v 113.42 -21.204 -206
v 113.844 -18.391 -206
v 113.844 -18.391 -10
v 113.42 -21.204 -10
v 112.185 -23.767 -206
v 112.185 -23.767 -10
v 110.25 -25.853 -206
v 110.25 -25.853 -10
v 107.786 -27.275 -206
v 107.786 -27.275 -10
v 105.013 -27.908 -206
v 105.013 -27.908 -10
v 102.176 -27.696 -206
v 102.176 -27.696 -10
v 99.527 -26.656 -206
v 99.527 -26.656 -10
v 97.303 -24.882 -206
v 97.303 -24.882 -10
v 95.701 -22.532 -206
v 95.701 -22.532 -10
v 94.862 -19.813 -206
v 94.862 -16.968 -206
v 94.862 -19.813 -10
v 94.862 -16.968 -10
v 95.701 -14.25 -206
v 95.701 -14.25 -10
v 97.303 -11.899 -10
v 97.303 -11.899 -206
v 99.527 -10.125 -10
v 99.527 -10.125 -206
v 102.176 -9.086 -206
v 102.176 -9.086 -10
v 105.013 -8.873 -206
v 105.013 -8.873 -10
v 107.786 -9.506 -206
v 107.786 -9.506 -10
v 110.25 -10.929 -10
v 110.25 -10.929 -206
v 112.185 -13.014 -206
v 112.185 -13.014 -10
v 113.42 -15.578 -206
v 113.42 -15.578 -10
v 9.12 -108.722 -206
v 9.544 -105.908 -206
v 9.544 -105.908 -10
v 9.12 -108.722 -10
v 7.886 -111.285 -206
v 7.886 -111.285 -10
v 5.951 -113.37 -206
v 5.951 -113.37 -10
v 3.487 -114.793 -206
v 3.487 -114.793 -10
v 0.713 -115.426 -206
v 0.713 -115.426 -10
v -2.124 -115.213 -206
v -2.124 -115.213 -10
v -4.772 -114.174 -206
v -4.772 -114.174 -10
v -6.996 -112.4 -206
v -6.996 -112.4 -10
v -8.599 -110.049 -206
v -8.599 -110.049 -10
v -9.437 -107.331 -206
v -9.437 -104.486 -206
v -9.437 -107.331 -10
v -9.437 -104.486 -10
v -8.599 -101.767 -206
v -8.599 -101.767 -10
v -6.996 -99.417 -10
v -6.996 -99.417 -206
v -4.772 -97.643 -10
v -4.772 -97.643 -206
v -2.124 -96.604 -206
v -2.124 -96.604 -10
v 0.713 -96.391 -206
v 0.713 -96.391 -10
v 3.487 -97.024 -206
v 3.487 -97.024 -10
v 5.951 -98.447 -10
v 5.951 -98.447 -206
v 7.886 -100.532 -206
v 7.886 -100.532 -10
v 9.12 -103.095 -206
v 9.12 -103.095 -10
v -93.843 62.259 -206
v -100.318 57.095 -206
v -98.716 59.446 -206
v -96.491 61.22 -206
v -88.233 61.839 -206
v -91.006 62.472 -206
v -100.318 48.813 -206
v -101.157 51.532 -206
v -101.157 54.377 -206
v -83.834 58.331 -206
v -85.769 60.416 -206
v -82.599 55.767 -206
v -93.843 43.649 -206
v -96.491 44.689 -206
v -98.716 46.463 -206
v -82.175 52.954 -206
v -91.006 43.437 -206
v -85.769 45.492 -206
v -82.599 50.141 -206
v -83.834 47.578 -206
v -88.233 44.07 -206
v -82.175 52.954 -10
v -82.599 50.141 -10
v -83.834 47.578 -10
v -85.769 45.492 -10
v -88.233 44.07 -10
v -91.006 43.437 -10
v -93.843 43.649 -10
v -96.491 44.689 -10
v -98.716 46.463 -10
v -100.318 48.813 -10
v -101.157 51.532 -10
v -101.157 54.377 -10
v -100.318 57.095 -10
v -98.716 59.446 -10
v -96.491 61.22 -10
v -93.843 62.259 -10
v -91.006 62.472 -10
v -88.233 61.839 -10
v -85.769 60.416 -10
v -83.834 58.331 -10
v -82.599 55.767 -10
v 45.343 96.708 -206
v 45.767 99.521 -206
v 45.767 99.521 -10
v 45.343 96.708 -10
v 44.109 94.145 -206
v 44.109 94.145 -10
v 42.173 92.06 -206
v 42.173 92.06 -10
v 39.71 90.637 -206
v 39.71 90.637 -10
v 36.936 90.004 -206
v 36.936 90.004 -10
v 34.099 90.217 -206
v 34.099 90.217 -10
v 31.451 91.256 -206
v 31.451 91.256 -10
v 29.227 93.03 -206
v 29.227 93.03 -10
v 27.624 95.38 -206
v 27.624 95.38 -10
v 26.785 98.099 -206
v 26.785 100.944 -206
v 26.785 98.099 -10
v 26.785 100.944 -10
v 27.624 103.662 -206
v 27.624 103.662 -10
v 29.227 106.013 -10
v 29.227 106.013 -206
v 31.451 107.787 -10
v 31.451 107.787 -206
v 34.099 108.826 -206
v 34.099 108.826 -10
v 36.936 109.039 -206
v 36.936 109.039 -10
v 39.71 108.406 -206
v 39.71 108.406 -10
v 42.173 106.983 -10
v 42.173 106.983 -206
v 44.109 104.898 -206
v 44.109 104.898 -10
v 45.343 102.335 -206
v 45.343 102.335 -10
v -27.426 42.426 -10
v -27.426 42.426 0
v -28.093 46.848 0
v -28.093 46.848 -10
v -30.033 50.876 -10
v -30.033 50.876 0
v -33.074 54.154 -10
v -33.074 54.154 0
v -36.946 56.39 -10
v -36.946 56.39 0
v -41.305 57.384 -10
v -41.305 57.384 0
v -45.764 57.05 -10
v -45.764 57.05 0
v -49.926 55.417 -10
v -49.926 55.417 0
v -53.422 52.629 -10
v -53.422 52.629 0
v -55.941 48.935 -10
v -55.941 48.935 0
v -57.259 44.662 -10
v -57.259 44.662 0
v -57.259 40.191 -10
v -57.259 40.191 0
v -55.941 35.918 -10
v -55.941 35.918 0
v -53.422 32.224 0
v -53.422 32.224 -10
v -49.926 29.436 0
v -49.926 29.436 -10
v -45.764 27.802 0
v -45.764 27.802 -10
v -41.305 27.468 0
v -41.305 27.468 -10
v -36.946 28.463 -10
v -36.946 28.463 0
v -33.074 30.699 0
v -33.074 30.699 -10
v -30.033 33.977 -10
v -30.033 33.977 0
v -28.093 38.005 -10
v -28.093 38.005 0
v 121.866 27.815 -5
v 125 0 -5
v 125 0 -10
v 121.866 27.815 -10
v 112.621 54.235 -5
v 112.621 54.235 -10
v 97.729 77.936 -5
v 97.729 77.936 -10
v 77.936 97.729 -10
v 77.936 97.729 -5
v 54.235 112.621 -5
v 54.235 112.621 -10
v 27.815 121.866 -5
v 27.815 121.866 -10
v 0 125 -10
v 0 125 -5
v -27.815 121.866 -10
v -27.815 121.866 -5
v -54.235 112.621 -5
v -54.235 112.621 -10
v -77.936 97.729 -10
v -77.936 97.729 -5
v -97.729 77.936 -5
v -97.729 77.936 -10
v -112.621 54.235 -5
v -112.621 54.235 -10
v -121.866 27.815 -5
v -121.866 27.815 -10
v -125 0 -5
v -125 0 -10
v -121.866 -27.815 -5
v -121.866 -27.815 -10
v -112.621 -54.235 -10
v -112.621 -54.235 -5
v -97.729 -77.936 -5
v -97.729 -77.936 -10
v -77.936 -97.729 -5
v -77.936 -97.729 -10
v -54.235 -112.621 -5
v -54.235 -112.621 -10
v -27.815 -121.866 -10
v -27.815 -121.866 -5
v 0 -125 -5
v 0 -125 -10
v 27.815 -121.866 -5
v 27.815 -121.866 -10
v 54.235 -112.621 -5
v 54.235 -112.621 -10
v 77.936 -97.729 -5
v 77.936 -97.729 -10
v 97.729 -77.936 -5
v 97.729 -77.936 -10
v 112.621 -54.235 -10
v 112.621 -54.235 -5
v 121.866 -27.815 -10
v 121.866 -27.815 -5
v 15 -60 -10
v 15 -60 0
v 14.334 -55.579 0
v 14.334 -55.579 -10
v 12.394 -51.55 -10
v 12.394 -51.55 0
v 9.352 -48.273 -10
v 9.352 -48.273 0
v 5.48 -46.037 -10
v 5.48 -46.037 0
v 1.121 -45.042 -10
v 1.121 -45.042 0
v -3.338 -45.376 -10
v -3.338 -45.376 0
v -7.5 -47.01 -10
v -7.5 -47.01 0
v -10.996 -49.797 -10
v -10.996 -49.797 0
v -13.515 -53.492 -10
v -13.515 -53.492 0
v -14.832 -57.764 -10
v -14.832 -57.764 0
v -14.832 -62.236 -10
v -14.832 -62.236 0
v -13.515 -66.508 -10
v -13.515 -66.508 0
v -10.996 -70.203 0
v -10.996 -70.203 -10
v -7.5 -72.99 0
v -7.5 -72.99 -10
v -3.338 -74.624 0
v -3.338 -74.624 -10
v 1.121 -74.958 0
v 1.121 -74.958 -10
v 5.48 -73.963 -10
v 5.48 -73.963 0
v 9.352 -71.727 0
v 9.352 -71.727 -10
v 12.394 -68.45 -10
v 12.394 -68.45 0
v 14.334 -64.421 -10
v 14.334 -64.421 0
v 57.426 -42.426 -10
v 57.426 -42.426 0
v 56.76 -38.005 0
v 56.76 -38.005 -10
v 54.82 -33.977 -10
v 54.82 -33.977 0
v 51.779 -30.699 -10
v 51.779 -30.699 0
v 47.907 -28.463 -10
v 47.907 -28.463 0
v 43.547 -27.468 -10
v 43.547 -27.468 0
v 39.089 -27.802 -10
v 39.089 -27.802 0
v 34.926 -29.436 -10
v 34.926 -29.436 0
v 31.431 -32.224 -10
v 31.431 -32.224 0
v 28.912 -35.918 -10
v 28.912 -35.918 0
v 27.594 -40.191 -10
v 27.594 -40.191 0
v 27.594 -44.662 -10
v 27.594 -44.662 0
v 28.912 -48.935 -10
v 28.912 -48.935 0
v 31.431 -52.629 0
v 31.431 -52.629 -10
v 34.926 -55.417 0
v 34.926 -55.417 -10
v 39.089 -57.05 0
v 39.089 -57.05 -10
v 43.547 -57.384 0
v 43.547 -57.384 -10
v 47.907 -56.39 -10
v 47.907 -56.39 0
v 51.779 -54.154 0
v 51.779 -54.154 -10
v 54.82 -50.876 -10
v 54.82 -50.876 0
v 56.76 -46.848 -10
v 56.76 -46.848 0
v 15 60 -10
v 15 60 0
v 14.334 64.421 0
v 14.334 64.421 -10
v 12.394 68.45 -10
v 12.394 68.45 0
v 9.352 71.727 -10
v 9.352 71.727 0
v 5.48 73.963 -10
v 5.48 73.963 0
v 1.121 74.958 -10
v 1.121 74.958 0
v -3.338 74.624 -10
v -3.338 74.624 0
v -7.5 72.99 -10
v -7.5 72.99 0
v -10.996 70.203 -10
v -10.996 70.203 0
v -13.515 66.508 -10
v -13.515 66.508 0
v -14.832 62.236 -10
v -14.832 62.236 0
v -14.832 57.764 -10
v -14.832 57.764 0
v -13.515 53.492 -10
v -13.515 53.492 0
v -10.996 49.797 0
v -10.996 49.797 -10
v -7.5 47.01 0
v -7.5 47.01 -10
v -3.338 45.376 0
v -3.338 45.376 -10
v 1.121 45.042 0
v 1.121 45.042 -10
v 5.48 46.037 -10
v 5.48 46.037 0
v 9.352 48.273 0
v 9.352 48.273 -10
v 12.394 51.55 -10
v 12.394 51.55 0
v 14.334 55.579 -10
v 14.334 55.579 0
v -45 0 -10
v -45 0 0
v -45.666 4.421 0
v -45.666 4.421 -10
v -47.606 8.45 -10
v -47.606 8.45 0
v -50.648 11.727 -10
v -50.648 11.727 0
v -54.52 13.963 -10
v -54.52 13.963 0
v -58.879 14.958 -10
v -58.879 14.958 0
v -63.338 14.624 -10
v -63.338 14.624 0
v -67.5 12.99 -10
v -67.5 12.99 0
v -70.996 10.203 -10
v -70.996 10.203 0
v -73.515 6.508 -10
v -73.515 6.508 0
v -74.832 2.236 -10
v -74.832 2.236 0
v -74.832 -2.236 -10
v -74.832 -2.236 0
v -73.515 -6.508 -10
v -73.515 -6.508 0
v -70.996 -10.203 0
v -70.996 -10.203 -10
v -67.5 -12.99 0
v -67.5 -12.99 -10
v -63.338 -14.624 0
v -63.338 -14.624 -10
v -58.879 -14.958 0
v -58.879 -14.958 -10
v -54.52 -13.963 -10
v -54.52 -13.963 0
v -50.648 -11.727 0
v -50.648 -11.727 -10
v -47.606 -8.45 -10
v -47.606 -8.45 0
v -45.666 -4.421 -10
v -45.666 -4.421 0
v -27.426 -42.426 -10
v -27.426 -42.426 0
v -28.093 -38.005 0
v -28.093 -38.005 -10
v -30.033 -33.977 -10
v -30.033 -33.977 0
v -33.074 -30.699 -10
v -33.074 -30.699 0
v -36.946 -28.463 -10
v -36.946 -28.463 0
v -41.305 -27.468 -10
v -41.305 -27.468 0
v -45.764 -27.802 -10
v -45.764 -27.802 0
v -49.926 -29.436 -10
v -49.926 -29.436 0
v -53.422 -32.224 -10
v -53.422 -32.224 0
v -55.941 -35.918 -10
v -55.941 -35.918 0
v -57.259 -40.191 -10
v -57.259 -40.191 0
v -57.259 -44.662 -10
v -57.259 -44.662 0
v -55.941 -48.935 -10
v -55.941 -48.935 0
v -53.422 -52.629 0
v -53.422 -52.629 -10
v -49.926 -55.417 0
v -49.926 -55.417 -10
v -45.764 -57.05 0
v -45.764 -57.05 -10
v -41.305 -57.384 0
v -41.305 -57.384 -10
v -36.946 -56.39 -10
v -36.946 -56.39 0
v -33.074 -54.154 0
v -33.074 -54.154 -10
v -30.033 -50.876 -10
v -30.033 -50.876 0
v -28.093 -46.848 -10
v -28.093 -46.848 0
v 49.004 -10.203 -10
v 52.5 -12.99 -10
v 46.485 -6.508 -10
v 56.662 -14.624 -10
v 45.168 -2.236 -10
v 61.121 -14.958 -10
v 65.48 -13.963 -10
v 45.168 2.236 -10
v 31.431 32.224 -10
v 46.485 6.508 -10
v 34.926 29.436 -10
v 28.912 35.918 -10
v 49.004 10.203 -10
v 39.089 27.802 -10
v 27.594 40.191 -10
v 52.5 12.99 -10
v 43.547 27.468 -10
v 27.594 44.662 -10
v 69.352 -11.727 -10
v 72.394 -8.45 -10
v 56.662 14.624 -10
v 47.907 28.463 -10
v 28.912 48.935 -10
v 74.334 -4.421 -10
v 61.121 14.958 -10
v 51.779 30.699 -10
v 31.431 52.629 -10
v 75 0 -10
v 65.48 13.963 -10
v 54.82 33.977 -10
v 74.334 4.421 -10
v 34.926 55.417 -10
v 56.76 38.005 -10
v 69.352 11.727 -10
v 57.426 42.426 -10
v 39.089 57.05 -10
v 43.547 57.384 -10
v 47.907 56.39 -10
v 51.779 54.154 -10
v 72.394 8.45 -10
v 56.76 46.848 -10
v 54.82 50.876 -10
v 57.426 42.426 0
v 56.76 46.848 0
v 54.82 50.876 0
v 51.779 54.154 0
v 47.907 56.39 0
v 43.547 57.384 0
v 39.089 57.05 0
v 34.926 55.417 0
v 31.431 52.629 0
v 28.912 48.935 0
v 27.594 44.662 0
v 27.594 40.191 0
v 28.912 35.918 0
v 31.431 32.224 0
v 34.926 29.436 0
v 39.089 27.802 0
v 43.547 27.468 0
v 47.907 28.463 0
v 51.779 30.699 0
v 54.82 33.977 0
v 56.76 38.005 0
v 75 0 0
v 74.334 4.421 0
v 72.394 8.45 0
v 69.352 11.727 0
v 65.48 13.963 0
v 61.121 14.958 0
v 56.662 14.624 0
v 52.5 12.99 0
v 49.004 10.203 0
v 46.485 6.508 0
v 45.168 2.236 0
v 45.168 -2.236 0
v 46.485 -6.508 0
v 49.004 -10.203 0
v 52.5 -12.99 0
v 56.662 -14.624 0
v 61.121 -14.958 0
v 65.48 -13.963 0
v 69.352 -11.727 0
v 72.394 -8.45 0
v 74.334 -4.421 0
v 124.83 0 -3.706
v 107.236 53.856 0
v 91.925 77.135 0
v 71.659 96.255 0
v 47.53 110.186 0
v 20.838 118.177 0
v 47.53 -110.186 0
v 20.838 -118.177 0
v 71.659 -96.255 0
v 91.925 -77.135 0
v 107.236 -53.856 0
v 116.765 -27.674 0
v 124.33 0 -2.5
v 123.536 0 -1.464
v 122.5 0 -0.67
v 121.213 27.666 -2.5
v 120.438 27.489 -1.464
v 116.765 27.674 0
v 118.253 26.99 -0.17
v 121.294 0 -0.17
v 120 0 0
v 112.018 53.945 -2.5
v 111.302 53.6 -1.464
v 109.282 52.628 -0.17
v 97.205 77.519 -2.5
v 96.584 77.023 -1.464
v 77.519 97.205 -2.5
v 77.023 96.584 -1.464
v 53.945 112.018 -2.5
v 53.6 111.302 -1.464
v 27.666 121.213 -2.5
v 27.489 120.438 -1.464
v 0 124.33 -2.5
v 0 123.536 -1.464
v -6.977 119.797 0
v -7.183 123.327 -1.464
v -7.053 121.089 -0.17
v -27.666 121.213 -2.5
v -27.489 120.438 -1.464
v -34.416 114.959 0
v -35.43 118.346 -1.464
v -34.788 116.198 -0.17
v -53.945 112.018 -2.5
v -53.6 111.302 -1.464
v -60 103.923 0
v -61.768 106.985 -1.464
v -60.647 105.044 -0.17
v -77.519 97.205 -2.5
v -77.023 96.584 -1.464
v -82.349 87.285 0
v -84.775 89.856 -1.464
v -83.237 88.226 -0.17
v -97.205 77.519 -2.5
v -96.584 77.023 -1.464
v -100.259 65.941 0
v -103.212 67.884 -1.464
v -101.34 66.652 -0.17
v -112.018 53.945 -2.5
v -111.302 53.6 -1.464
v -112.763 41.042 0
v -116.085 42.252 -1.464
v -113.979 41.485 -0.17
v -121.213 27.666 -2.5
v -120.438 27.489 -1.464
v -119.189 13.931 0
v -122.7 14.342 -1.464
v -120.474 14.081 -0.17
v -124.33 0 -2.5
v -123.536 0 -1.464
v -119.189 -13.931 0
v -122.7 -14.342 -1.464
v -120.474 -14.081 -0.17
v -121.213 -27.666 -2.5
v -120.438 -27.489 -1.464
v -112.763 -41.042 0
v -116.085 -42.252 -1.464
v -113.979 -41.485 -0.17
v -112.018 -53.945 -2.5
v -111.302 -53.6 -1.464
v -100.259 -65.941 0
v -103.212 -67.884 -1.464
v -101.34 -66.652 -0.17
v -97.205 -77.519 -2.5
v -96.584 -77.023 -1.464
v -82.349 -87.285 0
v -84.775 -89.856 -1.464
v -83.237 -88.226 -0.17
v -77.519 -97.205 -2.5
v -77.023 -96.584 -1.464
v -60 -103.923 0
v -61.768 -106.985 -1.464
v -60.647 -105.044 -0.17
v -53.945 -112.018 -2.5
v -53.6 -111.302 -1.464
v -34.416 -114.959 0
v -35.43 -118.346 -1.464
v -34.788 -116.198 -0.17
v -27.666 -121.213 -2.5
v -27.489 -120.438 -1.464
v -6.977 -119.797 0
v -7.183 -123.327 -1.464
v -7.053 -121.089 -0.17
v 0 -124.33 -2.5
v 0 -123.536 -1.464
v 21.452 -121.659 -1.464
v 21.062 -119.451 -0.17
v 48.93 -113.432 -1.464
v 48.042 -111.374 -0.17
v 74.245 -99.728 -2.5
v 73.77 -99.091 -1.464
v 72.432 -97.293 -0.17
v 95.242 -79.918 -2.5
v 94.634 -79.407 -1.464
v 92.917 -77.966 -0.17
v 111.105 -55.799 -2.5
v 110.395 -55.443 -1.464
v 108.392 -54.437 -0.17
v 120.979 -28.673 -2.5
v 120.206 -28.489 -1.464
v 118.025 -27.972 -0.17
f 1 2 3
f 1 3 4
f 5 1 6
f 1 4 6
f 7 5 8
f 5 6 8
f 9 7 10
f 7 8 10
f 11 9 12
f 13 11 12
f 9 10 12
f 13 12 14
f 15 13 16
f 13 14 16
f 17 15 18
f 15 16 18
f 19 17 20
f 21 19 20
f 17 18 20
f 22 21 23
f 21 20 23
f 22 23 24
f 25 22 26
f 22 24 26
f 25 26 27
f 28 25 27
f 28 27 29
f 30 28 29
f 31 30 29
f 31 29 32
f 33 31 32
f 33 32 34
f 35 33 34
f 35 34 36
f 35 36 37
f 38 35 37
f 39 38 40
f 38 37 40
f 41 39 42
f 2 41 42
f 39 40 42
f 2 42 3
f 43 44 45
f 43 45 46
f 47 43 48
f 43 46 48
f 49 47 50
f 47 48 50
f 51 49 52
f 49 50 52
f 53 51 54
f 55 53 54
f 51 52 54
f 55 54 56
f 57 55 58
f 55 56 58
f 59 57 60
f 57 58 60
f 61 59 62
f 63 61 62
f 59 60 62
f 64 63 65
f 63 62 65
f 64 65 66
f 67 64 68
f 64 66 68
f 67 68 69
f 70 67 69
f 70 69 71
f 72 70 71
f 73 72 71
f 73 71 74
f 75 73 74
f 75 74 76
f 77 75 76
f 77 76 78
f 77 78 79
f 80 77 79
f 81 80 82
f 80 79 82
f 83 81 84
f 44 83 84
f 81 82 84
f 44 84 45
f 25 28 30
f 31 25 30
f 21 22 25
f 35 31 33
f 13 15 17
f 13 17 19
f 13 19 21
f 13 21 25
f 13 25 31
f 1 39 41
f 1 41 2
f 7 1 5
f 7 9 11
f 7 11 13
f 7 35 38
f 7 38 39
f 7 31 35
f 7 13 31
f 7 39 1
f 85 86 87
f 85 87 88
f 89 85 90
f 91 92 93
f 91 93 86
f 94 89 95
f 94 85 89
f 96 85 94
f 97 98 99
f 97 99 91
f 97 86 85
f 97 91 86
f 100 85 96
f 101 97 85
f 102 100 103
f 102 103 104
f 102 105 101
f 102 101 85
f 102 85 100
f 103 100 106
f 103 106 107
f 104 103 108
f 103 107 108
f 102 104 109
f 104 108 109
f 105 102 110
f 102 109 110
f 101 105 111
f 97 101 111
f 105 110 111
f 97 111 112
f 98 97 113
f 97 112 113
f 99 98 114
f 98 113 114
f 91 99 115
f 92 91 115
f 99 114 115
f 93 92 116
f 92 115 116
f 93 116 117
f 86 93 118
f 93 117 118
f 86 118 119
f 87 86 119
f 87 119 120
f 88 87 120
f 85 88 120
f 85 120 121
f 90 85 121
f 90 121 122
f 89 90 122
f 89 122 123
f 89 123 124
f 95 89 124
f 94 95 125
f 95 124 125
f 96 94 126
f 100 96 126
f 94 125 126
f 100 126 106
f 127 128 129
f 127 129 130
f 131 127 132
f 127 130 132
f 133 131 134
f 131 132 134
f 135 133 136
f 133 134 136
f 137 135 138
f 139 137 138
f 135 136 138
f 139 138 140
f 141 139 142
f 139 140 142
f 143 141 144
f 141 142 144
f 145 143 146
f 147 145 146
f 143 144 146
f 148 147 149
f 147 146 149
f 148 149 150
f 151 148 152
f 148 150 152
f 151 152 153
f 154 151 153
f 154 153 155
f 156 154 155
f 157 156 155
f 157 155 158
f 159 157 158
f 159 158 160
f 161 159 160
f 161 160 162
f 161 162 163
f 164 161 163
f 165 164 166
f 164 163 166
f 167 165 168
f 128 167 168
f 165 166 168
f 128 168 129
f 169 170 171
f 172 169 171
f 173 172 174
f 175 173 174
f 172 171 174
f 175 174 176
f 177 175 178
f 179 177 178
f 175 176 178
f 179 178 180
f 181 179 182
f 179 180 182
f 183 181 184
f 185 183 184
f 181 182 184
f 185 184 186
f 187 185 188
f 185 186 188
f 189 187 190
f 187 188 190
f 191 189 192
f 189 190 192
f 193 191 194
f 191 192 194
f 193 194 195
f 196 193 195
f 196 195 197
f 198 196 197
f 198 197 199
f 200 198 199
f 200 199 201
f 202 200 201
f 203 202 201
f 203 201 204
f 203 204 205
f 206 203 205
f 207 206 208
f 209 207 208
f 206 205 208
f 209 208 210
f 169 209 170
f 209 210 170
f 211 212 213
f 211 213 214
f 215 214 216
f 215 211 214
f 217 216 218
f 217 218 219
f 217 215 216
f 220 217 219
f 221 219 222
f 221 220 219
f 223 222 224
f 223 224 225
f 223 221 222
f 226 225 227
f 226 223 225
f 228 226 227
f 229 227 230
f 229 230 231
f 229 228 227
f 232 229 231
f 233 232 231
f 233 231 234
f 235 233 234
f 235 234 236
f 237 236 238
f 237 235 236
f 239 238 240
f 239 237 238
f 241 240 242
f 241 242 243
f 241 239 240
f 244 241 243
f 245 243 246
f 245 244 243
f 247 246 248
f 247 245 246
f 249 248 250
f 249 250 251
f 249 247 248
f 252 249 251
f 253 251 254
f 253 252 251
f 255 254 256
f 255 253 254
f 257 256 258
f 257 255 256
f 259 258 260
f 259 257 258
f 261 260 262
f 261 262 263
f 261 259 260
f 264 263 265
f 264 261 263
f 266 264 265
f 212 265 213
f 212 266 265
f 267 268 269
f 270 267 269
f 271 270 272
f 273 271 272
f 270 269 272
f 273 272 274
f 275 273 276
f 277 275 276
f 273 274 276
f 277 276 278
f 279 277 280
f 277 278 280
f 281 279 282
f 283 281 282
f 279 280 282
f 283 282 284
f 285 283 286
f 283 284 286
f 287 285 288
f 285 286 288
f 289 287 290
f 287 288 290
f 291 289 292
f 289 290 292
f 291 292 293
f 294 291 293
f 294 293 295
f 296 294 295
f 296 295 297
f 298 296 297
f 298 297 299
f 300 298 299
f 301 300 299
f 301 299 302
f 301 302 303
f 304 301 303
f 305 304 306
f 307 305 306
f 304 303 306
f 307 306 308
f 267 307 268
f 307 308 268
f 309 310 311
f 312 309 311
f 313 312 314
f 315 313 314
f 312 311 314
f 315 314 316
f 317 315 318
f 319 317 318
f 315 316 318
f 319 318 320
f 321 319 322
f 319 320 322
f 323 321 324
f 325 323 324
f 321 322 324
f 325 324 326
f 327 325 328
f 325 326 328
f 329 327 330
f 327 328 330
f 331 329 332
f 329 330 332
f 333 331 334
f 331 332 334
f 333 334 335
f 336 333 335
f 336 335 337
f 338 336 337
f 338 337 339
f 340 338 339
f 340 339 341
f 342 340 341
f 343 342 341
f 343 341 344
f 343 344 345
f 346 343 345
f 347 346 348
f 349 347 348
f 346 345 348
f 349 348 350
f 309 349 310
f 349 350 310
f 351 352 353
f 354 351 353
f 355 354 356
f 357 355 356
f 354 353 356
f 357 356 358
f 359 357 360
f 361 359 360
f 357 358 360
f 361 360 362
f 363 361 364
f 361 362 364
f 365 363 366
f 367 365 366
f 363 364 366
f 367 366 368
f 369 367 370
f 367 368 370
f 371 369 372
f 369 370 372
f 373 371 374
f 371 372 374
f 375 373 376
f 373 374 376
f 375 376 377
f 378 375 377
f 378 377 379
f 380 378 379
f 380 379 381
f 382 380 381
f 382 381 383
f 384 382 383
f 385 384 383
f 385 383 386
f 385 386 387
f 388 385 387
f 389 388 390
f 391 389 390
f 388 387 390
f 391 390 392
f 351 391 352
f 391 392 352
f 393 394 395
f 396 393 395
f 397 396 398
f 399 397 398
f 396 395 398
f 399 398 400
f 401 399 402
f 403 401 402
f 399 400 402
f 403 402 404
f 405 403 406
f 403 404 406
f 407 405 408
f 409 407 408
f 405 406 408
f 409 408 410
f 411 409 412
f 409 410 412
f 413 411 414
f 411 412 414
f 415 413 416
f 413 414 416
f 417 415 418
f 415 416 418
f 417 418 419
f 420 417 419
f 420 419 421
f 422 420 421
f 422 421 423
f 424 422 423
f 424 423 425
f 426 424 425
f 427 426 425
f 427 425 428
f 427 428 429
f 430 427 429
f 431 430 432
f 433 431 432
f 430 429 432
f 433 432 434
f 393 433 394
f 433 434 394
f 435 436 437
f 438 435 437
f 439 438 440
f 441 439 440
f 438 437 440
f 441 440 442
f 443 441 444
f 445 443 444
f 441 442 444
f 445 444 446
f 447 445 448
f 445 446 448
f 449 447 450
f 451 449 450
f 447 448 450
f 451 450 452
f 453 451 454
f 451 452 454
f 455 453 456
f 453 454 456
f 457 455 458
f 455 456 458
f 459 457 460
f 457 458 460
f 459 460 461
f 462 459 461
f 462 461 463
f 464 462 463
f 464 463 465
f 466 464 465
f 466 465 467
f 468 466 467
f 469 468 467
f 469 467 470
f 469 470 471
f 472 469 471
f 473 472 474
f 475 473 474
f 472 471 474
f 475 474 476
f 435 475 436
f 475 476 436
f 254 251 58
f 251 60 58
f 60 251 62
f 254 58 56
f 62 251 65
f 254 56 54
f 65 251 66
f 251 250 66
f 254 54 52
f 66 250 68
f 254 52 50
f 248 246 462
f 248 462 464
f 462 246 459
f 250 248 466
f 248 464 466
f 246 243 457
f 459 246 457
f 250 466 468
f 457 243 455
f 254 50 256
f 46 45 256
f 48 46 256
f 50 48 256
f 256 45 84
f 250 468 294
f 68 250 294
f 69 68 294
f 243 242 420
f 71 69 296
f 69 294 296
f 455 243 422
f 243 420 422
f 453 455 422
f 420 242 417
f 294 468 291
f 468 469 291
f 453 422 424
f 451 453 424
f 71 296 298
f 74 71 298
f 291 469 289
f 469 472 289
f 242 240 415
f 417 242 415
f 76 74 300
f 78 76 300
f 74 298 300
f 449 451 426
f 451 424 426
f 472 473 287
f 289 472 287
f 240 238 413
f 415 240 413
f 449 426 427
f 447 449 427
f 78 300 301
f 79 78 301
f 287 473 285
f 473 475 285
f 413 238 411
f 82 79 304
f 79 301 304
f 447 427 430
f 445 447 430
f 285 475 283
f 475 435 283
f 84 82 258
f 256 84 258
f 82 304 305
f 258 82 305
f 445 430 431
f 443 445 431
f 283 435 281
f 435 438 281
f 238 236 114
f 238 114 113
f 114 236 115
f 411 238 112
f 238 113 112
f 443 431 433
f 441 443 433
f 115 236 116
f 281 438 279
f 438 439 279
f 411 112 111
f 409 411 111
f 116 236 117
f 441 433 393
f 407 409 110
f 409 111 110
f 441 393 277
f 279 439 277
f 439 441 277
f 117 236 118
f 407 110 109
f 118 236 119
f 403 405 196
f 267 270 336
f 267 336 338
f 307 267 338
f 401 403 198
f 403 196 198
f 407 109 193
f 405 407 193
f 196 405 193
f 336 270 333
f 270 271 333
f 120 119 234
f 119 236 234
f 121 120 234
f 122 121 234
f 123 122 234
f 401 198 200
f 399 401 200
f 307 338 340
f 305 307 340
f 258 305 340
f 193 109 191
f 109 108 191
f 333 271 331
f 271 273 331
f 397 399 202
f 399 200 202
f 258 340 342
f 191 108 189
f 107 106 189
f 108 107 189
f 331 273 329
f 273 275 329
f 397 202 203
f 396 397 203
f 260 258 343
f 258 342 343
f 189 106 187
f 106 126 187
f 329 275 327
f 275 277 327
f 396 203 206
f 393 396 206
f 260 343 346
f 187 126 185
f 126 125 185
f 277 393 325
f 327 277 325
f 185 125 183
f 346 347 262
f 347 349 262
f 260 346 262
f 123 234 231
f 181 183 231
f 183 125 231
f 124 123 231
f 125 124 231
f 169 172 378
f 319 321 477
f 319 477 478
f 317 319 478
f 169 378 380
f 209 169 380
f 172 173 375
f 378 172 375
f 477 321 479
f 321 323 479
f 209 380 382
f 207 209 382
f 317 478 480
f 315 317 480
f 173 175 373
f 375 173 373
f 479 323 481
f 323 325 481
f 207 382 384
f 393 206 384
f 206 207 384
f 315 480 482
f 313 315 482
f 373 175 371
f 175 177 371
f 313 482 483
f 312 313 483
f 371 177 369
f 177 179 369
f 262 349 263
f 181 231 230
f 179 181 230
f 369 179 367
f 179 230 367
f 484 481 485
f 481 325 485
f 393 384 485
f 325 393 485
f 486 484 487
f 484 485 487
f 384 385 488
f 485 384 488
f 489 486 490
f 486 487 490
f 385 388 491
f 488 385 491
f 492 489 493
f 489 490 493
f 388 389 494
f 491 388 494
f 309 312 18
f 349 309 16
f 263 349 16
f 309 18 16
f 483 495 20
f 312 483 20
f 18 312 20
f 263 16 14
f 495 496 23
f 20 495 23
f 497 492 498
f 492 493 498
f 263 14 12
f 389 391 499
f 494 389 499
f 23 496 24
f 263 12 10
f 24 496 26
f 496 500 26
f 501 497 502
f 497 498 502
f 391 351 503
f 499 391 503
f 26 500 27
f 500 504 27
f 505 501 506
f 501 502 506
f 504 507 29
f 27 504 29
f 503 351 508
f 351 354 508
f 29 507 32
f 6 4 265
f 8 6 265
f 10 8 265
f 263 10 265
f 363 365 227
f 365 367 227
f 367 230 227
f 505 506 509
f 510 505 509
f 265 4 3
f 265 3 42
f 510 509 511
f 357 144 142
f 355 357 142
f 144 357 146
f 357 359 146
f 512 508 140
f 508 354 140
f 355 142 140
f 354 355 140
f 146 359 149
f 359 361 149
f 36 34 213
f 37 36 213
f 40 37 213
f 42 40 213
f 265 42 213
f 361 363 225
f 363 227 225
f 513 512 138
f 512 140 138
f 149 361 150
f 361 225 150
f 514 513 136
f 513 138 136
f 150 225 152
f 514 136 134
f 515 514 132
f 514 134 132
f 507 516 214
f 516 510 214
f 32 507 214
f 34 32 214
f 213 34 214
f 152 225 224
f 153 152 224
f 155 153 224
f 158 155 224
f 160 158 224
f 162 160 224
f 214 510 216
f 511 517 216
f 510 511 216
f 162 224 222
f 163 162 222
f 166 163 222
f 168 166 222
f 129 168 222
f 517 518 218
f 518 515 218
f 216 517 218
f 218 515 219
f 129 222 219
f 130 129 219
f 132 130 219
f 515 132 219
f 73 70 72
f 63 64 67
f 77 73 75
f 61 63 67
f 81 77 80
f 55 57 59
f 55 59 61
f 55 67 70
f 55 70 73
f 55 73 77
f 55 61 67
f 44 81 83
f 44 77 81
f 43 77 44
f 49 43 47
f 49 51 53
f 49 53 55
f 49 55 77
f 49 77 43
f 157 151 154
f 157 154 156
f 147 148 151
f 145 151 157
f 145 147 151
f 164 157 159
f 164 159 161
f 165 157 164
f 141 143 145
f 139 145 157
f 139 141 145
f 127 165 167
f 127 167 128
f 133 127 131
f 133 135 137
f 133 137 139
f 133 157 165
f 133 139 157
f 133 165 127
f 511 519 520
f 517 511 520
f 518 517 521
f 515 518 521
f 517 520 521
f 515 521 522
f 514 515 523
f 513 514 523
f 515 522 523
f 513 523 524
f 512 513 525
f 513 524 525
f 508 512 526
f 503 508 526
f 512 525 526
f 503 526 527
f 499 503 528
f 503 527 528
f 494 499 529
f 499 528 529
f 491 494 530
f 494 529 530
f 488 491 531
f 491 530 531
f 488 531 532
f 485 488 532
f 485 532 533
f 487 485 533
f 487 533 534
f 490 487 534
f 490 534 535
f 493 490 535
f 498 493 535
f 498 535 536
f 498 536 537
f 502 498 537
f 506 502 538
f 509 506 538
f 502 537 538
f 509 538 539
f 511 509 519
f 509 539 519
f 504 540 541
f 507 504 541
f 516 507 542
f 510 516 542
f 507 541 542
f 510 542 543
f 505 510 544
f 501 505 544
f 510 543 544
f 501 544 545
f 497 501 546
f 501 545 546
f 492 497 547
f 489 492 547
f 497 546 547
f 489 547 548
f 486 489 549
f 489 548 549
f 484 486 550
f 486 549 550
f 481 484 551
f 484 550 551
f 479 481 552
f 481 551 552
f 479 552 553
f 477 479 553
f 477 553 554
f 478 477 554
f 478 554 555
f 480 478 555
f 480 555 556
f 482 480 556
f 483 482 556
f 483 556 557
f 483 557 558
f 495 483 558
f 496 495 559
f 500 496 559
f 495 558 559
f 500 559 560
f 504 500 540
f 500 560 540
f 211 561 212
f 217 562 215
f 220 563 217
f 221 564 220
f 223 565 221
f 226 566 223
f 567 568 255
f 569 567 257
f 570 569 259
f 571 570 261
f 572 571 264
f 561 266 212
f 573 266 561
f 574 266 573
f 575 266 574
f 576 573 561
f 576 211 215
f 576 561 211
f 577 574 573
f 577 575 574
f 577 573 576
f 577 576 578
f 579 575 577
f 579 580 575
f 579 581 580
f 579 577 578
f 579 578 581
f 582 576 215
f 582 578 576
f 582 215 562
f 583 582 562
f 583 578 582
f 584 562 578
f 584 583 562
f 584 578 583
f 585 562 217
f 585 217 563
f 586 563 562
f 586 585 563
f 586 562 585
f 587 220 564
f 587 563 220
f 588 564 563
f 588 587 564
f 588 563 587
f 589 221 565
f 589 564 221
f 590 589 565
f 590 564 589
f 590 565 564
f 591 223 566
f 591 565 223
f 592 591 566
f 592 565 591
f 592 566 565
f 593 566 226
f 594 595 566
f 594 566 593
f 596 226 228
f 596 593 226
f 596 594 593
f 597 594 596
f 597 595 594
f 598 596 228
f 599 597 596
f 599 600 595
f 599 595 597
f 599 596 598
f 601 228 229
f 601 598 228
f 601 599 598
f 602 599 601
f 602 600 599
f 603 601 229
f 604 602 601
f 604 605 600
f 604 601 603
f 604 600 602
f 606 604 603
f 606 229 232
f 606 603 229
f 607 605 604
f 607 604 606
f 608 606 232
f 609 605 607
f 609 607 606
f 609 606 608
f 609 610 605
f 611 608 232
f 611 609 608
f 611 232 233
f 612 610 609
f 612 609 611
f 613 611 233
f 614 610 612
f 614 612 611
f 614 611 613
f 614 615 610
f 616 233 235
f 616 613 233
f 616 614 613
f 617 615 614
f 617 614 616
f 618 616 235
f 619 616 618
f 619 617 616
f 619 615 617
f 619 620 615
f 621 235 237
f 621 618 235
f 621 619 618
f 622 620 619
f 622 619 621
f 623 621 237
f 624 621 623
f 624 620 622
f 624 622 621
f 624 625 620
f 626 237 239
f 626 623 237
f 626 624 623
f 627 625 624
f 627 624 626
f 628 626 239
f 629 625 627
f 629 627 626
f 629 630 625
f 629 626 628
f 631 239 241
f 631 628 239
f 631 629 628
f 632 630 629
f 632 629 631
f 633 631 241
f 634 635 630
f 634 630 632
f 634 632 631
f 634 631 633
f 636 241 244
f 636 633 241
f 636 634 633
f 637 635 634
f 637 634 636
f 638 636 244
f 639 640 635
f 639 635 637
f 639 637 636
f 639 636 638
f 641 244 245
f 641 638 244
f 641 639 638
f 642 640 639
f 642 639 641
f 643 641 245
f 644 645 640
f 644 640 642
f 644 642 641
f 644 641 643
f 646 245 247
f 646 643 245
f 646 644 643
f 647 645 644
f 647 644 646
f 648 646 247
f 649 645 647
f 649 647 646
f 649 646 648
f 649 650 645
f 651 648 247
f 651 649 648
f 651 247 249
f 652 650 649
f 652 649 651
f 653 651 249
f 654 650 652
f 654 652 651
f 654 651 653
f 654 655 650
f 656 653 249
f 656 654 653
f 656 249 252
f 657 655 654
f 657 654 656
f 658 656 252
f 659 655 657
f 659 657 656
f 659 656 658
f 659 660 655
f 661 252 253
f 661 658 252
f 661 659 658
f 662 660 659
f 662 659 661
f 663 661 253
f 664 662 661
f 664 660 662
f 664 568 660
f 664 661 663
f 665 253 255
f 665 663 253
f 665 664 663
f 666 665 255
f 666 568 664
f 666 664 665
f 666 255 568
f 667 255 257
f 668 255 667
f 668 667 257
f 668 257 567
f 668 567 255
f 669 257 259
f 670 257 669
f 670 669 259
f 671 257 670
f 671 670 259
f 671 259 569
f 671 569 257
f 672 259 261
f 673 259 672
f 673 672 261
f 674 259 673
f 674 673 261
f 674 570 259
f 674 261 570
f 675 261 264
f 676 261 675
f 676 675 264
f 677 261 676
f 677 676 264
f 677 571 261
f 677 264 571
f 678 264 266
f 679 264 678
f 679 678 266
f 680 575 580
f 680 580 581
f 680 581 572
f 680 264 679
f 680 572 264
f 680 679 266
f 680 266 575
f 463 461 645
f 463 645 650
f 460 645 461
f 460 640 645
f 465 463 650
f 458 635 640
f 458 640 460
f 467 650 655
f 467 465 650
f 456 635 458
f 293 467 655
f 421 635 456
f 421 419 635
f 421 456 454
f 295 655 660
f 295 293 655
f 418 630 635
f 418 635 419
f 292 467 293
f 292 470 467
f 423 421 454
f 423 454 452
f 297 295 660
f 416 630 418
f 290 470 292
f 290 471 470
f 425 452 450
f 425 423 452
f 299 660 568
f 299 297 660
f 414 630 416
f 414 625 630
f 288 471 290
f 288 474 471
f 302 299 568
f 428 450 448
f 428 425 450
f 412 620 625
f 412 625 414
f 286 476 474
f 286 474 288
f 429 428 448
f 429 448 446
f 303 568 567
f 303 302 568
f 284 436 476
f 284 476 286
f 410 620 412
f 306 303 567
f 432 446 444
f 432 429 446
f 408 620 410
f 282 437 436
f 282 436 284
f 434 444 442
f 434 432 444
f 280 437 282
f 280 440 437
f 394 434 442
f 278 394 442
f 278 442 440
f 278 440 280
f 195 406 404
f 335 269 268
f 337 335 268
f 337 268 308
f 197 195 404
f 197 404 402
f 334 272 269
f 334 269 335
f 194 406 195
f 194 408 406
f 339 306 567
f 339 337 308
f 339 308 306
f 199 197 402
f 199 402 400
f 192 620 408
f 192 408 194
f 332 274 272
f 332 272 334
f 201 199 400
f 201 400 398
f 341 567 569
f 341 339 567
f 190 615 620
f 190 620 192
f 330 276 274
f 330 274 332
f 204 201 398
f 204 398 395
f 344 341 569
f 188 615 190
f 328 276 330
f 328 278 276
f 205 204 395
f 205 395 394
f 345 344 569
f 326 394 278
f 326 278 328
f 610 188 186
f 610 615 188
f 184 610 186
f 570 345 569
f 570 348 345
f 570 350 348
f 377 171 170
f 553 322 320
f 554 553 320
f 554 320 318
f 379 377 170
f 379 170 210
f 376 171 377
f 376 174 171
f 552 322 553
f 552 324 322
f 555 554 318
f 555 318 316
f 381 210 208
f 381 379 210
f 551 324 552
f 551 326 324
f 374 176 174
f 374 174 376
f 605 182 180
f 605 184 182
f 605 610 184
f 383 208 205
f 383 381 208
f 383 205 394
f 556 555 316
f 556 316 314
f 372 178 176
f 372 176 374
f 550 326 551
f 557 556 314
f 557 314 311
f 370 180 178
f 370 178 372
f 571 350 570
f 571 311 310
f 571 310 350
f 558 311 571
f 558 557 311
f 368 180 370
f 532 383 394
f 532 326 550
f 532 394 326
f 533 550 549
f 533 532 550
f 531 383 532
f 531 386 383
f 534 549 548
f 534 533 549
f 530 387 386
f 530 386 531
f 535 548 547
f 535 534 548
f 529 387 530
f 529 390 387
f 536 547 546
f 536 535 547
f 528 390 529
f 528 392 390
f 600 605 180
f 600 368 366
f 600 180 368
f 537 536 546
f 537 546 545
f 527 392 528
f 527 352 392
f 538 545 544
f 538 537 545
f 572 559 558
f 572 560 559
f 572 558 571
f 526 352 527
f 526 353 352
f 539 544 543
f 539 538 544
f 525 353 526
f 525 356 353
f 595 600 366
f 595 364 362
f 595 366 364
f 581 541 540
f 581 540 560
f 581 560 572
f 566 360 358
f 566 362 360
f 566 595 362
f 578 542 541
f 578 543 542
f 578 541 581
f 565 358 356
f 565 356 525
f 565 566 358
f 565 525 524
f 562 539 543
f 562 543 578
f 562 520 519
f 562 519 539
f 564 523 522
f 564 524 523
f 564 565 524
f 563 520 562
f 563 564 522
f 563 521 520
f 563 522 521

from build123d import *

# Parameters (mm, degrees)
F0_R     = 125
F2_DEPTH = 10
F1_R     = 15
F3_DEPTH = 10
F4_R     = 5
F5_R     = 9.544074
F6_DEPTH = 196


with BuildPart() as f2:
    # F0 (on Top) → F2 (new body)
    with BuildSketch(Plane.XY):
        Circle(F0_R)
    extrude(amount=-F2_DEPTH)

    # F1 (on face) → F3 (cut)
    with BuildSketch(Plane.XY):
        with Locations((-42.426407, 42.426407)):
            Circle(F1_R)
        with Locations((0, 60)):
            Circle(F1_R)
        with Locations((42.426407, 42.426407)):
            Circle(F1_R)
        with Locations((60, 0)):
            Circle(F1_R)
        with Locations((42.426407, -42.426407)):
            Circle(F1_R)
        with Locations((0, -60)):
            Circle(F1_R)
        with Locations((-42.426407, -42.426407)):
            Circle(F1_R)
        with Locations((-60, 0)):
            Circle(F1_R)
    extrude(amount=-F3_DEPTH, mode=Mode.SUBTRACT)

    # F4
    f4_edges = [f2.edges().sort_by_distance(p)[0] for p in [
        (-125, 0, 0),
    ]]
    fillet(f4_edges, radius=F4_R)

    # F5 (on face) → F6 (join)
    with BuildSketch(Plane(origin=(0, 0, -10), x_dir=(1, 0, 0), z_dir=(0, 0, -1))):
        with Locations((0, 105.908468)):
            Circle(F5_R)
        with Locations((104.299481, 18.390813)):
            Circle(F5_R)
        with Locations((36.22283, -99.521406)):
            Circle(F5_R)
        with Locations((-91.719424, -52.954234)):
            Circle(F5_R)
    extrude(amount=F6_DEPTH)


solid = f2.part
